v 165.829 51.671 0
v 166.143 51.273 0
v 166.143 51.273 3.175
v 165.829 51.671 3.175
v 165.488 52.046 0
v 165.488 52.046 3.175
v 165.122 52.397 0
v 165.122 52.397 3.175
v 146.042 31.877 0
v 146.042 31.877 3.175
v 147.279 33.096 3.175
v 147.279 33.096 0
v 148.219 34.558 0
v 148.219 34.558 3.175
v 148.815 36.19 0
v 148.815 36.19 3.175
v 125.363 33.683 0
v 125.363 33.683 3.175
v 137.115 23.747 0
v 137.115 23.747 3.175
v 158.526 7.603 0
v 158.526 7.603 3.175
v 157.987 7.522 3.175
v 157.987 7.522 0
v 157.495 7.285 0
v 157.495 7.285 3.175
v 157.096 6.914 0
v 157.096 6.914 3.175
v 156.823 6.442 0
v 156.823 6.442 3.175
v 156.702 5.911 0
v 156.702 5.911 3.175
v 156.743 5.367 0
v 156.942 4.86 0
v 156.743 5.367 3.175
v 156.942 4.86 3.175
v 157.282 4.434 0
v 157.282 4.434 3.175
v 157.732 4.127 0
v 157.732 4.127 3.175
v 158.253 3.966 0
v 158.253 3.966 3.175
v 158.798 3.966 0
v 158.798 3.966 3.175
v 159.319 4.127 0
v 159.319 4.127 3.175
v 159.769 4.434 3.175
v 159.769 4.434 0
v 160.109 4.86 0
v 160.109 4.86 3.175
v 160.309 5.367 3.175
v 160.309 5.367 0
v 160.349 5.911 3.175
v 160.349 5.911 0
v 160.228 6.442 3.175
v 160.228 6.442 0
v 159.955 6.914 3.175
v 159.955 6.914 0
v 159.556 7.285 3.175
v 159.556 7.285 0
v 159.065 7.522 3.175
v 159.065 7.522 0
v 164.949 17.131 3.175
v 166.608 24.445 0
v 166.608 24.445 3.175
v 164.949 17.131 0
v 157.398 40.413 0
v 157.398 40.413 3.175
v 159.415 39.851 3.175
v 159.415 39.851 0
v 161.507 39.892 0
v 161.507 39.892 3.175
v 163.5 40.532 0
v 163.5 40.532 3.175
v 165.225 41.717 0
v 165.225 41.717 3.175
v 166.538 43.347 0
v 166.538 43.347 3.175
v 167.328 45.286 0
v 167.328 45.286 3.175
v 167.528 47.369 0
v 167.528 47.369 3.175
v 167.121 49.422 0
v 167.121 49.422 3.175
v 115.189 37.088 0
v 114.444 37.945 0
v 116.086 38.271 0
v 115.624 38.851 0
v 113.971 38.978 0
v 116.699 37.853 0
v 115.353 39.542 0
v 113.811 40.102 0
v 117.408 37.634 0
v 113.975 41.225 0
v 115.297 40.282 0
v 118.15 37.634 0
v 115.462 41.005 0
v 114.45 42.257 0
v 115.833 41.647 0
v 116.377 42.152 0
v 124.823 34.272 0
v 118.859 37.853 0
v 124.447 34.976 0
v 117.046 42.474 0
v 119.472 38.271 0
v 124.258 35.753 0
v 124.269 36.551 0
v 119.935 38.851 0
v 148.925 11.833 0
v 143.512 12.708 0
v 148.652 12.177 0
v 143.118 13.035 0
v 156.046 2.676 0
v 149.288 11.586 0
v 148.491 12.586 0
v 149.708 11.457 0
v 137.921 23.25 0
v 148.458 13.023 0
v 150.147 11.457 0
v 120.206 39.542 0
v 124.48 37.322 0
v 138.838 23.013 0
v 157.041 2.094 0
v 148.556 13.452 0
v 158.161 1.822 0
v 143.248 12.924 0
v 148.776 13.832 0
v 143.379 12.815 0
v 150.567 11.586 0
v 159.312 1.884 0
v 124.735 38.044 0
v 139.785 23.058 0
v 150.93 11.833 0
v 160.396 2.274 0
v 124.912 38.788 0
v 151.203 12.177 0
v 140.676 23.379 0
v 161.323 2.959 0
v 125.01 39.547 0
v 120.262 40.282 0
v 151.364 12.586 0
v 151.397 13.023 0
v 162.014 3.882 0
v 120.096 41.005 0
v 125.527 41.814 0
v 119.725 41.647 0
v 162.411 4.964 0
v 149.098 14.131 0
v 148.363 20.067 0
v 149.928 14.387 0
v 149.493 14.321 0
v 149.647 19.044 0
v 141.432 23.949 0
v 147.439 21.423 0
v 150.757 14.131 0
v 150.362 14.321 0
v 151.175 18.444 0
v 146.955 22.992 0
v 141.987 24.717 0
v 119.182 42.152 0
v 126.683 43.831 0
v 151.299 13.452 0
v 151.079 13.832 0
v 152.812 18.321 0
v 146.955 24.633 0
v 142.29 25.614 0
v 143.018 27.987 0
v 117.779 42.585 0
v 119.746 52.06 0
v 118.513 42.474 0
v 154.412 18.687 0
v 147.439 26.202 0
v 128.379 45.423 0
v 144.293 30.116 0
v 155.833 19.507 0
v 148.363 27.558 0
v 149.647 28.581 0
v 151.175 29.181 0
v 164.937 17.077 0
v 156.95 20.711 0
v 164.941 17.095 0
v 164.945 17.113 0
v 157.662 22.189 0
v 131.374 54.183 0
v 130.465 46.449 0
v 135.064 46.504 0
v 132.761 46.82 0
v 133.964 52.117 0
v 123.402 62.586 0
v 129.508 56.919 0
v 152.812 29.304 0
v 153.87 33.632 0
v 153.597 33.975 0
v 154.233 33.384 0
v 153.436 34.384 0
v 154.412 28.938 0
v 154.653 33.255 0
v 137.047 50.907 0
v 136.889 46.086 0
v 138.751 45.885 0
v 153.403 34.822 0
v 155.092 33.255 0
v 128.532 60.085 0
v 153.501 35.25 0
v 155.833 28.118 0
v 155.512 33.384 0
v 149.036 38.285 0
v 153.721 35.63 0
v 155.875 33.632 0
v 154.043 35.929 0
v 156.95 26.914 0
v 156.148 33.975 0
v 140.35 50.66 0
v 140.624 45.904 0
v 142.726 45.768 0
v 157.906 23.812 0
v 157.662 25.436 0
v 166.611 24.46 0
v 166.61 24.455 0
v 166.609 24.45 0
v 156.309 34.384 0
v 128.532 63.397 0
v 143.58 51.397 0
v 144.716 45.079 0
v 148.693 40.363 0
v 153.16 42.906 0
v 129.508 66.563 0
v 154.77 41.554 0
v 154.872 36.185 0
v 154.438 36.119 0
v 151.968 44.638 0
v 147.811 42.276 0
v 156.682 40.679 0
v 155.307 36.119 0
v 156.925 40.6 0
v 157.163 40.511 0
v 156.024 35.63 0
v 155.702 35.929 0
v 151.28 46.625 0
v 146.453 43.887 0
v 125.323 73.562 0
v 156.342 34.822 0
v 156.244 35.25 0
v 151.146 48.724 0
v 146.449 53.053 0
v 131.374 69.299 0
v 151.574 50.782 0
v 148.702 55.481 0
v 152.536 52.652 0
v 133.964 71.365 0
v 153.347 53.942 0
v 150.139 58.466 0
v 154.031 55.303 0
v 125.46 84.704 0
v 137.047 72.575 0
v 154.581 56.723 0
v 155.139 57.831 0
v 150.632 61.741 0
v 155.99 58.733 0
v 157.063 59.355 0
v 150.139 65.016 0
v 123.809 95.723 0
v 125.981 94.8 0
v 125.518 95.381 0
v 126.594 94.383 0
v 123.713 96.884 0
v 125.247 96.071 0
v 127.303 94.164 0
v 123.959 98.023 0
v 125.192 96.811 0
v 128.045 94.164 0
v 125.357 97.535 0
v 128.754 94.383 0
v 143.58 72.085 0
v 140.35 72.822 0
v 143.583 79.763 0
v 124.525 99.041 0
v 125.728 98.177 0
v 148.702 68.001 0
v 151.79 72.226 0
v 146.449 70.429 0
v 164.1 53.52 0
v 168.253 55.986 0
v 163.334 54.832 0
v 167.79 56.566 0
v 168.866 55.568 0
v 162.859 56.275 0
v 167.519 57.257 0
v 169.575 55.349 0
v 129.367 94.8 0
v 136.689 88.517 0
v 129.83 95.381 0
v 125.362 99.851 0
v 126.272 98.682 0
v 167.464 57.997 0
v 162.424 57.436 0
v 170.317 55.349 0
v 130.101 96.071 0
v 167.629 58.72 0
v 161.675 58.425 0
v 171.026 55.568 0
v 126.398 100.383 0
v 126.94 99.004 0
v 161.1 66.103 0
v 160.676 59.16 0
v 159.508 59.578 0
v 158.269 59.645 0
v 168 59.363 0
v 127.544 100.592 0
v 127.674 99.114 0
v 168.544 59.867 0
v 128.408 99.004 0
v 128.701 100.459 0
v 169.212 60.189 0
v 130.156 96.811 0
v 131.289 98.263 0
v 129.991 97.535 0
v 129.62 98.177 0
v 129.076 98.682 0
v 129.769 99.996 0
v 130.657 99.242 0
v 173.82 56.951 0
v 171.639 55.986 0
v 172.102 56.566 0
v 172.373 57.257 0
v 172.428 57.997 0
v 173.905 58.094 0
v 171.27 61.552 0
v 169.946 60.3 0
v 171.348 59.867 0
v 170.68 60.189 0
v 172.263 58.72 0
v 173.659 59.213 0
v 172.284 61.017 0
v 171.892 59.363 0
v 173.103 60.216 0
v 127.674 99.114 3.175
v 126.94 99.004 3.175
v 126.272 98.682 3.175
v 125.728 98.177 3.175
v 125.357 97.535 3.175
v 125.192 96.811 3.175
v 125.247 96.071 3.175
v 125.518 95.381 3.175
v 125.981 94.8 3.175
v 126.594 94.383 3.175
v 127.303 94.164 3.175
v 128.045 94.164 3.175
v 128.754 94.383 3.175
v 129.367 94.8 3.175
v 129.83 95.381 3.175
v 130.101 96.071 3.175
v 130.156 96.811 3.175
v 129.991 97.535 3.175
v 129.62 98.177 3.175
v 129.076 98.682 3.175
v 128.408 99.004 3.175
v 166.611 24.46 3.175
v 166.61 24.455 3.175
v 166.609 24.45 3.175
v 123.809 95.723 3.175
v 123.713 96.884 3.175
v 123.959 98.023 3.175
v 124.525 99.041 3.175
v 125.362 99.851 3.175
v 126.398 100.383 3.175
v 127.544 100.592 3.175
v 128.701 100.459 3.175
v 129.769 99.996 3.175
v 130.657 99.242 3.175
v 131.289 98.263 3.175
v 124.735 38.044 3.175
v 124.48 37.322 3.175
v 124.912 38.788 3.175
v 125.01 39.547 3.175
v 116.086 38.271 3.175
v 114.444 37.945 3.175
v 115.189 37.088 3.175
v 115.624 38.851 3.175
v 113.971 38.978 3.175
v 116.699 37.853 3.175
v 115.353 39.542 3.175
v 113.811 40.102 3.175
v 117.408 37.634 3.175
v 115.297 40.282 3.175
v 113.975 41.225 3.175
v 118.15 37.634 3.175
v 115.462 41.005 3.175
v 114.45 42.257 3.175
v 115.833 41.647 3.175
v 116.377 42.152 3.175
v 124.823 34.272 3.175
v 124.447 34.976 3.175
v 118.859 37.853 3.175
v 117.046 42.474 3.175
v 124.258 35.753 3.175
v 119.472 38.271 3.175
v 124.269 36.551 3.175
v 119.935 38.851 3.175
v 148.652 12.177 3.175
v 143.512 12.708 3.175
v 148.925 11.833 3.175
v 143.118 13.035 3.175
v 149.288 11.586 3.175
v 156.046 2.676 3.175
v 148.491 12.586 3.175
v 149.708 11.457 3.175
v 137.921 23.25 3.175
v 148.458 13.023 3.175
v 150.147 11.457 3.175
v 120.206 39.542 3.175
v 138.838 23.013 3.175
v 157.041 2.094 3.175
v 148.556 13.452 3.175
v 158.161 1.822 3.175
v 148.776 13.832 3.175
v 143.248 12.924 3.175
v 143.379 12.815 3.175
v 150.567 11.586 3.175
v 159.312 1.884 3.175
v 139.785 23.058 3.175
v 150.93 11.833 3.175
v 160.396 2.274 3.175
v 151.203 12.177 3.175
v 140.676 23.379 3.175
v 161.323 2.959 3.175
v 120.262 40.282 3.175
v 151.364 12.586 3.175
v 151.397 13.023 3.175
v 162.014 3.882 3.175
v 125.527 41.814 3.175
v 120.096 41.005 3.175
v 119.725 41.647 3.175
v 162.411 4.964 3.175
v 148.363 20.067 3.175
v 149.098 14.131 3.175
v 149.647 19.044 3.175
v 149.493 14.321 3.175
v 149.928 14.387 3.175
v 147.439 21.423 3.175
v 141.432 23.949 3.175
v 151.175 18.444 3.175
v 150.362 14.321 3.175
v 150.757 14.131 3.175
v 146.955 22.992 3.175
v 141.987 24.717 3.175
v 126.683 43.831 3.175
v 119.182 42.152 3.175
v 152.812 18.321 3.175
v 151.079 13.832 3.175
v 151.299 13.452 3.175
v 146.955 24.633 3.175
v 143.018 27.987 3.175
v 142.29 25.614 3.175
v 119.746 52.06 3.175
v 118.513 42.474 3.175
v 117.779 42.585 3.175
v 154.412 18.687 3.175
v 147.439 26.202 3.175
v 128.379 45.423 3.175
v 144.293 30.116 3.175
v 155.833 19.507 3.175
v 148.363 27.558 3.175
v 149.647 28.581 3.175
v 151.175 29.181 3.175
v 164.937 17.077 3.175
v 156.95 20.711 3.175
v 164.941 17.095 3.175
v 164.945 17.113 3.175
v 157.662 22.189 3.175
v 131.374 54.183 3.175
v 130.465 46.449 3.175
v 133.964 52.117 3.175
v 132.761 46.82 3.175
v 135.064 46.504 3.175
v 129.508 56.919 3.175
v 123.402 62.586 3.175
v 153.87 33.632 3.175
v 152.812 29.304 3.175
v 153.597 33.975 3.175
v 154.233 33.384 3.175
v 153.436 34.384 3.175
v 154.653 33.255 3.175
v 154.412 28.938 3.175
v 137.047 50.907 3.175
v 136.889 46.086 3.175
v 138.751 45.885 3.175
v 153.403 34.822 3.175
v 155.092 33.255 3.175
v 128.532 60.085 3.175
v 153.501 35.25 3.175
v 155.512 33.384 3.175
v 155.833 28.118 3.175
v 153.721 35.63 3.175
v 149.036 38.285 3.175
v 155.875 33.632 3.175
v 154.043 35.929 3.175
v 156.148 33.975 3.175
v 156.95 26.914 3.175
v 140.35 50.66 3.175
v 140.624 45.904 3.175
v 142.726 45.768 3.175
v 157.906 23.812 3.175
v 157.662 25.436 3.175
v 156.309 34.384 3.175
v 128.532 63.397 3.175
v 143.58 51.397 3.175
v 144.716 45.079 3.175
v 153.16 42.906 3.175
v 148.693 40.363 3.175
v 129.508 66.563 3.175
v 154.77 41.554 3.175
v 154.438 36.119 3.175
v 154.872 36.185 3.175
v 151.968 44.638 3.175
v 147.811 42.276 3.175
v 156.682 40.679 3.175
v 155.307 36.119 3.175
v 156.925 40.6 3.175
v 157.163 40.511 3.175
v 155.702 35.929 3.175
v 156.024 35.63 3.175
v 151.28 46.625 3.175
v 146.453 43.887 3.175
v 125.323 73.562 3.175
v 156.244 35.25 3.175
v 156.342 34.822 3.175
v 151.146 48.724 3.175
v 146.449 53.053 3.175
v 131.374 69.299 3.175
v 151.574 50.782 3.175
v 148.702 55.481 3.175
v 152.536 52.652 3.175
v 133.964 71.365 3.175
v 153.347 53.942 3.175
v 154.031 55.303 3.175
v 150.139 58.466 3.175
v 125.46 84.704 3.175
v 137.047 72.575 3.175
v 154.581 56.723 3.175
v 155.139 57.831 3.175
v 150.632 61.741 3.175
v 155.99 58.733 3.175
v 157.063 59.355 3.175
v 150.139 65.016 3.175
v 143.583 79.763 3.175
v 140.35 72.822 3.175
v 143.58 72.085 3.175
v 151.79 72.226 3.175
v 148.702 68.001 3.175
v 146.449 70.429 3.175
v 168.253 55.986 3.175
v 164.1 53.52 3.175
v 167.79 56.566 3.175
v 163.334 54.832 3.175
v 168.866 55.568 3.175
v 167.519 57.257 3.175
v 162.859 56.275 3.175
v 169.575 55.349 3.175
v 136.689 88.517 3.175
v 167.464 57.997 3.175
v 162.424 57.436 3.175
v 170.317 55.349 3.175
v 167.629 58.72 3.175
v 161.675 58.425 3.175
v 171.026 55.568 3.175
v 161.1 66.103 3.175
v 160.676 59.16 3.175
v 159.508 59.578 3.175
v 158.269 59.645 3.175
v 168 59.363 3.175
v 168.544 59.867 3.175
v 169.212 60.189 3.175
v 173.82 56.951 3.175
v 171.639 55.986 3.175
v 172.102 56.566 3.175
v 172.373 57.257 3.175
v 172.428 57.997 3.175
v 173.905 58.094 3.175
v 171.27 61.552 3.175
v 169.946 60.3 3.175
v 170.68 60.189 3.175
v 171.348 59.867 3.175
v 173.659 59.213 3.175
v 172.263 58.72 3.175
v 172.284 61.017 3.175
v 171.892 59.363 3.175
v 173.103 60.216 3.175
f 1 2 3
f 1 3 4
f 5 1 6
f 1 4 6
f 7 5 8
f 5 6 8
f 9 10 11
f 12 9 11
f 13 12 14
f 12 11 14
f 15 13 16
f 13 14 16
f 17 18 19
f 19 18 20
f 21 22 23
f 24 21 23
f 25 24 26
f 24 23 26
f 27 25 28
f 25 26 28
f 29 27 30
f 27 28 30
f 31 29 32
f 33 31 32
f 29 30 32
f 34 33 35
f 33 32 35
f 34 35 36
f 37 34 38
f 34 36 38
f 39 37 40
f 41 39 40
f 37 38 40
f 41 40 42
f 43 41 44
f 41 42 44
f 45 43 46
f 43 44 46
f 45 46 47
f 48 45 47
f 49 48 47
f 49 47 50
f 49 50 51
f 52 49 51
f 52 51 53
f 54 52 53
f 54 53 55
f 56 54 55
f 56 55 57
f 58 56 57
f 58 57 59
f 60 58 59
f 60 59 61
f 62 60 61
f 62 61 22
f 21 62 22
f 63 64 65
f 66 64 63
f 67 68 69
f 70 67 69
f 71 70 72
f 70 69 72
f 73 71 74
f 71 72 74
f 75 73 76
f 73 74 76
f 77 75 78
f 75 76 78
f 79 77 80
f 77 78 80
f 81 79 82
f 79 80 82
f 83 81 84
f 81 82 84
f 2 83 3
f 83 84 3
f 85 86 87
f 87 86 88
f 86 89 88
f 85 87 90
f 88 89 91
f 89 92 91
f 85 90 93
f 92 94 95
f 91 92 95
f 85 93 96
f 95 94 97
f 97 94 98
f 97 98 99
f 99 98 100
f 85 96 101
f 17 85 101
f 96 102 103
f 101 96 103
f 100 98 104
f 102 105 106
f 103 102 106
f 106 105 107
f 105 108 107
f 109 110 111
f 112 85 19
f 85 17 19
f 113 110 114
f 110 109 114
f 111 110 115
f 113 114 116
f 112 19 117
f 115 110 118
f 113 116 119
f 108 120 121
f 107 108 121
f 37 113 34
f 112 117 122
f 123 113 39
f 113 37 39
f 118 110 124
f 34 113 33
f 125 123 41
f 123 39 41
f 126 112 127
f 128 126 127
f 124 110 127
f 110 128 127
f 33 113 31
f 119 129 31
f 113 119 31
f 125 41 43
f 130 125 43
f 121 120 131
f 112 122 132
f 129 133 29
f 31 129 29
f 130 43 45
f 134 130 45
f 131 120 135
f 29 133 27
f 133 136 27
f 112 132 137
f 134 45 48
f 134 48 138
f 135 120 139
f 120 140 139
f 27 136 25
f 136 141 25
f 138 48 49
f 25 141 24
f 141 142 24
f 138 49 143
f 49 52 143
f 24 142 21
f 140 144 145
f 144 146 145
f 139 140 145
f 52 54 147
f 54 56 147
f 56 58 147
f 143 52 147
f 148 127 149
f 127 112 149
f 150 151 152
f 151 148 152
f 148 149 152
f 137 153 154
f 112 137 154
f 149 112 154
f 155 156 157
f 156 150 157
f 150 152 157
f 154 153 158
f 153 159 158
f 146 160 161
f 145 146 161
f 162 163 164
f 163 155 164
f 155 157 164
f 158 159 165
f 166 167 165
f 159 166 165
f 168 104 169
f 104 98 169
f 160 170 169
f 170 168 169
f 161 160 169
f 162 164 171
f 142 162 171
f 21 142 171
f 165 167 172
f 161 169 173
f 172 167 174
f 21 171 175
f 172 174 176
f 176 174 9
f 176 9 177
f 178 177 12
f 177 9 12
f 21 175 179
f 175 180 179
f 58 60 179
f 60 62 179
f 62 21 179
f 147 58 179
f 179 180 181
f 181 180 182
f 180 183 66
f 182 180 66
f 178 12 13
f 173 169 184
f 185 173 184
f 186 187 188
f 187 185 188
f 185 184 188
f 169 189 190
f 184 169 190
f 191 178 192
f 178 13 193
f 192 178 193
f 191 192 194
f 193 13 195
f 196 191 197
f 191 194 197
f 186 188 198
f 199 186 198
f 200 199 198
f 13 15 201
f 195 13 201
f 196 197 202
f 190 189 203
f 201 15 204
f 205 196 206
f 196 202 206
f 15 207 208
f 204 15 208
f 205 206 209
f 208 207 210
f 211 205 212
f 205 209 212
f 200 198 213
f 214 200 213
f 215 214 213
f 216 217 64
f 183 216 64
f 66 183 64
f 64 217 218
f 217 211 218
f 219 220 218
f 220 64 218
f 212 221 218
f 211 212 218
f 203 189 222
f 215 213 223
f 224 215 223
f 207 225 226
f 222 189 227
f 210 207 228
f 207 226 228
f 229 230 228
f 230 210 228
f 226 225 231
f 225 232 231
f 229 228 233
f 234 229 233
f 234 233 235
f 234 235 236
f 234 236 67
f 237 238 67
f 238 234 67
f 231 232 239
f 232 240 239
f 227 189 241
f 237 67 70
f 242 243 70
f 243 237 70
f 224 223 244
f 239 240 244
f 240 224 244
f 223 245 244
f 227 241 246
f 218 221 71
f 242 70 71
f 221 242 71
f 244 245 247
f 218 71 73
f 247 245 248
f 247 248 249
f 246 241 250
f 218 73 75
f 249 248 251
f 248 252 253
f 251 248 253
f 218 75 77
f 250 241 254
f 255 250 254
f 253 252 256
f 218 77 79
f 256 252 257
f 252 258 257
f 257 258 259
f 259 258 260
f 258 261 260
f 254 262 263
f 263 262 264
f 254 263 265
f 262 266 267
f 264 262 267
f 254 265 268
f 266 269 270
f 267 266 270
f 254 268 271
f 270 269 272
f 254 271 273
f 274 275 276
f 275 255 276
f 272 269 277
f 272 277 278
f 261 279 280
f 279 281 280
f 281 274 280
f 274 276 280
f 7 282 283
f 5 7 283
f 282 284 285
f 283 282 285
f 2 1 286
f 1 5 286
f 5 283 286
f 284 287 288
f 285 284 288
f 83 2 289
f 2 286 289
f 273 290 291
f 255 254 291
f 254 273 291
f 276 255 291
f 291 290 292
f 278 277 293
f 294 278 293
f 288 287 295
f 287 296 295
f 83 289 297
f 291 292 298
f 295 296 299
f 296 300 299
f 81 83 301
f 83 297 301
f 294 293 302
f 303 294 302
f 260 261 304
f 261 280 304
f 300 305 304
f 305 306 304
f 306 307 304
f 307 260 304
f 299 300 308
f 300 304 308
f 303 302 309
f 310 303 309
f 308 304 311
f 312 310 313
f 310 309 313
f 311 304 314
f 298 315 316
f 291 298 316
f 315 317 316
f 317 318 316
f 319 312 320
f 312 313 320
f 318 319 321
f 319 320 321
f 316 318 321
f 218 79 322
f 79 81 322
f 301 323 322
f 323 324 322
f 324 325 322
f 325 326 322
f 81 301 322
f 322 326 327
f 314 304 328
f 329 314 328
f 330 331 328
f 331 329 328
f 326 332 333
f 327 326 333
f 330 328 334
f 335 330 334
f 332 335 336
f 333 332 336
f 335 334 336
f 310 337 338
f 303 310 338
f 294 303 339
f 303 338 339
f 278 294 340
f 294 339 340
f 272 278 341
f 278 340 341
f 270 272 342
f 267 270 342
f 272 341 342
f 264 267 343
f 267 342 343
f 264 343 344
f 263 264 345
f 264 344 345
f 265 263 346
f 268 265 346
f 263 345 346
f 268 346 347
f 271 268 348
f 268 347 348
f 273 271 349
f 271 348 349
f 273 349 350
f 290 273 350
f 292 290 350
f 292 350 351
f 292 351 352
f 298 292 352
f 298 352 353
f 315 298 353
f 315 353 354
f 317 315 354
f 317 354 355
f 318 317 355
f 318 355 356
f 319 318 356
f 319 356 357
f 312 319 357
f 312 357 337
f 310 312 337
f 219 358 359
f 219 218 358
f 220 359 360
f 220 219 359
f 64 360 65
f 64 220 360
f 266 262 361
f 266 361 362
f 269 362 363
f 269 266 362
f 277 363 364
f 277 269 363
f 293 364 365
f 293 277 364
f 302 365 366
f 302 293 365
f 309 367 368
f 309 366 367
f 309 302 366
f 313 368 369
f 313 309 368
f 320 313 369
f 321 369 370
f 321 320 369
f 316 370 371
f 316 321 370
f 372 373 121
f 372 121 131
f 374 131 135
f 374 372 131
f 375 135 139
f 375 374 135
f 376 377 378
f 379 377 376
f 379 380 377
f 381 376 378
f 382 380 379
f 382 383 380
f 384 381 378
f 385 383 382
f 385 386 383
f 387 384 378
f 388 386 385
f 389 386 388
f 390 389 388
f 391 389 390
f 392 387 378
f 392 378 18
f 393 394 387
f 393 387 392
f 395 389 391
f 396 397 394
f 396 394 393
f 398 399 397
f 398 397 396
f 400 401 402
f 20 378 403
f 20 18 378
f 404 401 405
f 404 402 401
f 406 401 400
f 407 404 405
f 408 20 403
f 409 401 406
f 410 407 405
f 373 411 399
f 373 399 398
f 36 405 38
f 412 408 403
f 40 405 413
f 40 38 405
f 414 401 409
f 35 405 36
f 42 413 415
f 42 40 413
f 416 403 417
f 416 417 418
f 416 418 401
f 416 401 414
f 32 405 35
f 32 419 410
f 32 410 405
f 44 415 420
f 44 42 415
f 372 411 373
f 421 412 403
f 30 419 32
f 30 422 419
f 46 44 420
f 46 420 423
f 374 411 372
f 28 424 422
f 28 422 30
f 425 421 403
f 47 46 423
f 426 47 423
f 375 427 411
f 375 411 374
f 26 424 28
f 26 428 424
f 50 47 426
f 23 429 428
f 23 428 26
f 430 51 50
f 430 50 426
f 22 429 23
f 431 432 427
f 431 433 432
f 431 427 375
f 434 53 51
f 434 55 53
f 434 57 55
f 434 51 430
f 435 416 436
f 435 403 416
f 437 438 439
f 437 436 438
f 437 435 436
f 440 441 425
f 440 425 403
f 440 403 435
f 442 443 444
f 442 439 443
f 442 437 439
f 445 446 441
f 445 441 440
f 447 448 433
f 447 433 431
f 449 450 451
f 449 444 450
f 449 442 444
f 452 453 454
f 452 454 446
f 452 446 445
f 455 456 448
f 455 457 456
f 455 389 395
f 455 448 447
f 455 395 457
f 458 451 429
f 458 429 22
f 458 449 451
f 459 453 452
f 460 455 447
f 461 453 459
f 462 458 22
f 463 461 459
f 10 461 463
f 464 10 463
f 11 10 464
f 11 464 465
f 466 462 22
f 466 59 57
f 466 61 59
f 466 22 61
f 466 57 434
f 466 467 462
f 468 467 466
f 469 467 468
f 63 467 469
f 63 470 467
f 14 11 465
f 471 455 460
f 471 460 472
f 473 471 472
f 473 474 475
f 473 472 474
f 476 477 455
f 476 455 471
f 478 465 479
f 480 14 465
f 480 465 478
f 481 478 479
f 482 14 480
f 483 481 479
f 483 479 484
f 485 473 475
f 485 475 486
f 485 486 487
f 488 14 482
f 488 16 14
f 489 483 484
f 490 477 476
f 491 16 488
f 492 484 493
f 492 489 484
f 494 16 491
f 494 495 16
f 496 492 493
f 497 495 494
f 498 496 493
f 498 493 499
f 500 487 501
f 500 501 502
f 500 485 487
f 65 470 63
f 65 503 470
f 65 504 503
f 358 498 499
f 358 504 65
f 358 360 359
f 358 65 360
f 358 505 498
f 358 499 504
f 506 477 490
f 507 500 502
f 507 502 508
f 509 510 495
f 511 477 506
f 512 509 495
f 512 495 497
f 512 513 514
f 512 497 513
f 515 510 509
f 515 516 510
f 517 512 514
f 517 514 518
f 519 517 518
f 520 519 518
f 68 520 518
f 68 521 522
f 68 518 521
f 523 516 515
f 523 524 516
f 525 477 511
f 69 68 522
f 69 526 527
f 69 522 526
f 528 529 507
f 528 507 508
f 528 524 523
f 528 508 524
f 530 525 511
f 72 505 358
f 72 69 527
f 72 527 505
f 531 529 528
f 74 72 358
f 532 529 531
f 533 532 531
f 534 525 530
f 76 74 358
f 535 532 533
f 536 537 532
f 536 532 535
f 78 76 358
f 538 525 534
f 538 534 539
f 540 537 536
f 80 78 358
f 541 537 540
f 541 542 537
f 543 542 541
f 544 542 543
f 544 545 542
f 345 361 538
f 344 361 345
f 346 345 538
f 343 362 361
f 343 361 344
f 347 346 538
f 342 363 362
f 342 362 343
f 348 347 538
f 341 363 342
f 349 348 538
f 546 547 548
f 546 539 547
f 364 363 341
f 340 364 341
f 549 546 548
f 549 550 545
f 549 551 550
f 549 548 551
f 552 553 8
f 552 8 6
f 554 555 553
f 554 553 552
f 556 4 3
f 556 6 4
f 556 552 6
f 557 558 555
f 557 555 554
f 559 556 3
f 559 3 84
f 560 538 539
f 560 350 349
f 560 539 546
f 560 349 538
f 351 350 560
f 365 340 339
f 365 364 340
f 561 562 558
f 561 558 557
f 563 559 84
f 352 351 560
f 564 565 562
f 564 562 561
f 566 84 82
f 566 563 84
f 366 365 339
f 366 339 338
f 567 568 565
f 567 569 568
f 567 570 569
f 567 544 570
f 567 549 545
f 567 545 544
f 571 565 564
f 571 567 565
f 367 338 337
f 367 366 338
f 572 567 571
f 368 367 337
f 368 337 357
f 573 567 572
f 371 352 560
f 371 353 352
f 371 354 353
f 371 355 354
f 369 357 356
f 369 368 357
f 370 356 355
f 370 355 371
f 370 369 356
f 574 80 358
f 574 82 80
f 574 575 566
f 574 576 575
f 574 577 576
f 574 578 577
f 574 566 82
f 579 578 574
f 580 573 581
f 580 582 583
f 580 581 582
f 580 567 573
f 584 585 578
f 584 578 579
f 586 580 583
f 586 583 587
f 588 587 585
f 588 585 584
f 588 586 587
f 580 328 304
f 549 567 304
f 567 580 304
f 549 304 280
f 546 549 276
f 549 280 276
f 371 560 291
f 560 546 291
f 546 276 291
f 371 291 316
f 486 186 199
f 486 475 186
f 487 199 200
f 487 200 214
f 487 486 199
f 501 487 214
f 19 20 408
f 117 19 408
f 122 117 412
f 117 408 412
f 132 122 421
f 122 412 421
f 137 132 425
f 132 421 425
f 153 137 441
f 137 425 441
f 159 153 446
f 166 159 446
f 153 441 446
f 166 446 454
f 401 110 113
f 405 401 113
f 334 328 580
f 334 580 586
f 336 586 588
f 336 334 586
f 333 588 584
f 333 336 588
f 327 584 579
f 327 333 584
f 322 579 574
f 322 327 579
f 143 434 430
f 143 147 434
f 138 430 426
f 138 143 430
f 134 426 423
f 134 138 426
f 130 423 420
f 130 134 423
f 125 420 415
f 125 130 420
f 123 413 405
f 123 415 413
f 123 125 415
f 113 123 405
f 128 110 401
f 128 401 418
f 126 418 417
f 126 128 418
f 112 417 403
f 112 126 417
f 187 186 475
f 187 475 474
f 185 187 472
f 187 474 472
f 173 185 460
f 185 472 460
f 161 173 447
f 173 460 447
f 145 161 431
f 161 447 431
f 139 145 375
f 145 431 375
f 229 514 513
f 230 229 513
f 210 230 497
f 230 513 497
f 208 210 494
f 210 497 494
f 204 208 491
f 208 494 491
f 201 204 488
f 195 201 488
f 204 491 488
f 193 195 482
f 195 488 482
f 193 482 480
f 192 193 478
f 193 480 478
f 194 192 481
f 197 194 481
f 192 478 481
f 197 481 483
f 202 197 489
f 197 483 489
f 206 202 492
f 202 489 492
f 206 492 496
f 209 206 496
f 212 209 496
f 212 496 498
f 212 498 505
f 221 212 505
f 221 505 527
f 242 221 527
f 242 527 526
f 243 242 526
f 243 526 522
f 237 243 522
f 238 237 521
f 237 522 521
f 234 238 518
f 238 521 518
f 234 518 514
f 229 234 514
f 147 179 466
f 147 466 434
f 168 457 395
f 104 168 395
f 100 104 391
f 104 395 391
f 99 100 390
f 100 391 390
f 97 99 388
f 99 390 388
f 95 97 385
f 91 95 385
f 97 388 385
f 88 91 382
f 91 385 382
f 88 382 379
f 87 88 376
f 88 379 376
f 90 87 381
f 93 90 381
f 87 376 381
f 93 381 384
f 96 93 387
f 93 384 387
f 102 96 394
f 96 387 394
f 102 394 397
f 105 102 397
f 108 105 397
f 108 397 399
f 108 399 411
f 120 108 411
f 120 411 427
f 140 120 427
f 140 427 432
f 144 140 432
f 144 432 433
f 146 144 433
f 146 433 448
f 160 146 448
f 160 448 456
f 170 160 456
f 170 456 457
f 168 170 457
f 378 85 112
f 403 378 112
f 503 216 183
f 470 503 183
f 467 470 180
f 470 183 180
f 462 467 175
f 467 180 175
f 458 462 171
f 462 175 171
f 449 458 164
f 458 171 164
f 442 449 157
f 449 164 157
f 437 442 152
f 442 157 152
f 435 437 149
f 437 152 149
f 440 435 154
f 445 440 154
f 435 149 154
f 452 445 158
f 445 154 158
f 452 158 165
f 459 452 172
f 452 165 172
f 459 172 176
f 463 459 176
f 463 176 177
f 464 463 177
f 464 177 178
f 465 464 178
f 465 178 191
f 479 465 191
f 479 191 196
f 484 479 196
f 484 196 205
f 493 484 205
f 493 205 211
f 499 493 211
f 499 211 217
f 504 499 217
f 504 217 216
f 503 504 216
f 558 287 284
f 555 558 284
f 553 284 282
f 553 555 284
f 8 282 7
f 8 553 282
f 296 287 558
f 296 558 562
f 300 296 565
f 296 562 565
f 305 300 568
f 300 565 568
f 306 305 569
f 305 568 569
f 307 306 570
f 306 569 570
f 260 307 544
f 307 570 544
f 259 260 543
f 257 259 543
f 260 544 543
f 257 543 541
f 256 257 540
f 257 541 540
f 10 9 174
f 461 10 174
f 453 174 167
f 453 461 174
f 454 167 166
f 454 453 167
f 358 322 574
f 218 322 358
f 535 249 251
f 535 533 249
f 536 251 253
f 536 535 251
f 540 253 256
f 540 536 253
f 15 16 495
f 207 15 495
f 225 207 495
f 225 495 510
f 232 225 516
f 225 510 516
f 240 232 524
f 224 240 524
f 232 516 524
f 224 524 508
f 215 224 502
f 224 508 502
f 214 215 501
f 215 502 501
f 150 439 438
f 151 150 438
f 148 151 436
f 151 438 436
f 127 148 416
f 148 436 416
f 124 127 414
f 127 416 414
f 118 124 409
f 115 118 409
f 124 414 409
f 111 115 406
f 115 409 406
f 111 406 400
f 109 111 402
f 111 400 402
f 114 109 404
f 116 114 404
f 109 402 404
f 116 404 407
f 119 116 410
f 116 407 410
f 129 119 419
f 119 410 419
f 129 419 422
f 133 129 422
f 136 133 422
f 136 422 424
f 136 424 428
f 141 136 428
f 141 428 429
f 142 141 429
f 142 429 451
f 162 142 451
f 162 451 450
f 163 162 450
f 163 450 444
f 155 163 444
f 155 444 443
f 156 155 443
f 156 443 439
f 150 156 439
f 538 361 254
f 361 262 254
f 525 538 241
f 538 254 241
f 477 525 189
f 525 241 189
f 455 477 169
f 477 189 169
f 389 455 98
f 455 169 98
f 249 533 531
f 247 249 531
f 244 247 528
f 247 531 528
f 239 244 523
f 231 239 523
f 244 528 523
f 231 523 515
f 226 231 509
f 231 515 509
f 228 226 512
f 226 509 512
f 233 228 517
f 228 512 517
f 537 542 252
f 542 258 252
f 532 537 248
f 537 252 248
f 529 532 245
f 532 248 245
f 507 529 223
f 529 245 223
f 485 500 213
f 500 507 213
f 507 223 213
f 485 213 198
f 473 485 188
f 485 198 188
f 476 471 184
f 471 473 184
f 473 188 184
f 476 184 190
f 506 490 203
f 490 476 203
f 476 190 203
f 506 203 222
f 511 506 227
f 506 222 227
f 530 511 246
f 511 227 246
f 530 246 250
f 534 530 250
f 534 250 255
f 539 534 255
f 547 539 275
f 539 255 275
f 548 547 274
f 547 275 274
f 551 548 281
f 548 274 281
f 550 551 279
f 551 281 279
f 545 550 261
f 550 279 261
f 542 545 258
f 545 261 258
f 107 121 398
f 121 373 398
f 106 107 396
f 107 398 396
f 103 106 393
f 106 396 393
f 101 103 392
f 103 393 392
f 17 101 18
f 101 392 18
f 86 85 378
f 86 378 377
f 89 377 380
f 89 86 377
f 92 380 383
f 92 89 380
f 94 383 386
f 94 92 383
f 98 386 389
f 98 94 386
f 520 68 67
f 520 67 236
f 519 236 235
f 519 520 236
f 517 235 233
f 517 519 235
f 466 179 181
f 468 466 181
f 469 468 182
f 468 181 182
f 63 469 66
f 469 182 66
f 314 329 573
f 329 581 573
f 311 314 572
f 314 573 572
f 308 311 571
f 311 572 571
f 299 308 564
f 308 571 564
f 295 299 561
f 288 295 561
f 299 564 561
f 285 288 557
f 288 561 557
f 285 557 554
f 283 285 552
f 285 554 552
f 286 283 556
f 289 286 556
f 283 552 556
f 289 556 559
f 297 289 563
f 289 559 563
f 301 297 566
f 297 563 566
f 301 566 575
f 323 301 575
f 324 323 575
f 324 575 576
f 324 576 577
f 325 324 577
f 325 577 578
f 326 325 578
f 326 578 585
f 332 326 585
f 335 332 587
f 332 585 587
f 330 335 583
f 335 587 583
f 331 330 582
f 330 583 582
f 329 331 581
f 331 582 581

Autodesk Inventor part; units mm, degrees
ref_plane "YZ Plane" through (0, 0, 0) normal (1, 0, 0) x (0, 1, 0)
ref_plane "XZ Plane" through (0, 0, 0) normal (0, 1, 0) x (-1, 0, 0)
ref_plane "XY Plane" through (0, 0, 0) normal (0, 0, 1) x (1, 0, 0)
sketch "Sketch1" plane through (0, 0, 0) normal (0, 0, 1) x (1, 0, 0)
  line L0 (0, 0) -> (304.8, 0) construction
  line L1 (304.8, 0) -> (304.8, 50.8) construction
  line L2 (304.8, 50.8) -> (0, 50.8) construction
  line L3 (0, 50.8) -> (0, 0) construction
  circle A0 centre (152.4, 23.8125) radius 6.35 construction
  circle A1 centre (152.4, 23.8125) radius 34.29 construction
  circle A2 centre (152.4, 23.8125) radius 22.225 construction
  line L4 (152.4, 23.8125) -> (139.52, 61.741) construction
  circle A3 centre (139.52, 61.741) radius 9.525 construction
  circle A4 centre (139.52, 61.741) radius 17.78 construction
  circle A5 centre (91.5619, 85.09) radius 31.75 construction
  circle A6 centre (163.3424, 109.4657) radius 31.75 construction
  circle A7 centre (222.6465, 85.09) radius 31.75 construction
  line L5 (0, 50.8) -> (0, 53.34) construction
  line L6 (0, 53.34) -> (304.8, 53.34) construction
  line L7 (304.8, 53.34) -> (304.8, 50.8) construction
  circle A8 centre (139.52, 61.741) radius 21.59 construction
  circle A9 centre (152.4, 23.8125) radius 46.99 construction
  circle A10 centre (152.4, 23.8125) radius 50.8 construction
  arc A11 (86.3865, 79.4564) -> (92.4363, 92.6899) centre (91.5619, 85.09) ccw construction
  circle A12 centre (163.3424, 109.4657) radius 7.65 construction
  arc A13 (222.2546, 92.73) -> (226.29, 78.3634) centre (222.6465, 85.09) ccw construction
  circle A14 centre (163.3424, 109.4657) radius 9.1 construction
  circle A15 centre (139.52, 61.741) radius 22.9 construction
  line L8 (86.3865, 79.4564) -> (124.0276, 44.8769) construction
  line L9 (170.8782, 108.1486) -> (162.078, 57.7984) construction
  line L10 (92.4363, 92.6899) -> (91.5619, 85.09) construction
  line L11 (91.5619, 85.09) -> (86.3865, 79.4564) construction
  circle A16 centre (127.6738, 96.6252) radius 3.9688
  circle A17 centre (127.6738, 96.6252) radius 7.9375 construction
  line L12 (92.4363, 92.6899) -> (126.7664, 88.7398) construction
  line L13 (133.1953, 90.9229) -> (158.0208, 114.9615) construction
  line L14 (158.0208, 114.9615) -> (163.3424, 109.4657) construction
  line L15 (170.8782, 108.1486) -> (163.3424, 109.4657) construction
  line L16 (139.52, 61.741) -> (127.6738, 96.6252) construction
  line L17 (91.5619, 85.09) -> (163.3424, 109.4657) construction
  line L18 (152.4, 23.8125) -> (91.5619, 85.09) construction
  line L19 (152.4, 23.8125) -> (163.3424, 109.4657) construction
  circle A18 centre (127.6738, 96.6252) radius 9.2075 construction
  circle A19 centre (127.6738, 96.6252) radius 6.1595 construction
  arc A20 (92.4363, 92.6899) -> (86.3865, 79.4564) centre (91.5619, 85.09) ccw construction
  circle A21 centre (163.3424, 109.4657) radius 25.4 construction
  circle A22 centre (222.6465, 85.09) radius 25.4 construction
  line L20 (104.7627, 113.9656) -> (78.361, 56.2144) construction
  circle A23 centre (91.5619, 85.09) radius 25.4 construction
  line L21 (214.0607, 115.6571) -> (231.2324, 54.5229) construction
  line L22 (56.0019, 185.6657) -> (208.4019, 185.6657)
  line L23 (208.4019, 185.6657) -> (208.4019, -4.8343)
  line L24 (208.4019, -4.8343) -> (56.0019, -4.8343)
  line L25 (56.0019, -4.8343) -> (56.0019, 185.6657)
  circle A24 centre (139.52, 61.741) radius 11.1125
  arc A25 (226.1312, 75.4959) -> (221.6192, 95.3086) centre (223.8752, 85.4023) ccw construction
  line L26 (221.4349, 84.7168) -> (229.5152, 60.6363) construction
  line L27 (223.8752, 85.4023) -> (229.5152, 60.6363) construction
  line L28 (221.4349, 84.7168) -> (213.3547, 108.7973) construction
  line L29 (223.8752, 85.4023) -> (218.2352, 110.1682) construction
  arc A26 (212.5972, 111.0549) -> (214.1122, 106.5398) centre (213.3547, 108.7973) ccw construction
  arc A27 (218.764, 107.8464) -> (217.7065, 112.49) centre (218.2352, 110.1682) ccw construction
  arc A28 (218.764, 107.8464) -> (214.1122, 106.5398) centre (229.5152, 60.6363) ccw construction
  arc A29 (217.7065, 112.49) -> (212.5972, 111.0549) centre (229.5152, 60.6363) ccw construction
  line L30 (213.3547, 108.7973) -> (212.5972, 111.0549) construction
  line L31 (218.2352, 110.1682) -> (217.7065, 112.49) construction
  arc A30 (221.6192, 95.3086) -> (218.2029, 94.349) centre (229.5152, 60.6363) ccw construction
  arc A31 (226.1312, 75.4959) -> (224.667, 75.0846) centre (229.5152, 60.6363) ccw construction
  line L32 (104.4015, 107.0791) -> (92.7013, 84.5343) construction
  line L33 (81.0012, 61.9895) -> (90.3961, 85.5882) construction
  arc A32 (100.6718, 111.3992) -> (98.9102, 106.9744) centre (99.791, 109.1868) ccw construction
  arc A33 (103.3046, 104.9655) -> (105.4983, 109.1926) centre (104.4015, 107.0791) ccw construction
  arc A34 (103.3046, 104.9655) -> (98.9102, 106.9744) centre (81.0012, 61.9895) ccw construction
  line L34 (99.791, 109.1868) -> (100.6718, 111.3992) construction
  line L35 (104.4015, 107.0791) -> (105.4983, 109.1926) construction
  arc A35 (105.4983, 109.1926) -> (100.6718, 111.3992) centre (81.0012, 61.9895) ccw construction
  arc A36 (218.2029, 94.349) -> (224.667, 75.0846) centre (221.4349, 84.7168) ccw construction
  arc A37 (88.0213, 75.5164) -> (97.3814, 93.5522) centre (92.7013, 84.5343) ccw construction
  line L36 (90.3961, 85.5882) -> (99.791, 109.1868) construction
  line L37 (92.7013, 84.5343) -> (81.0012, 61.9895) construction
  arc A38 (88.0213, 75.5164) -> (86.6381, 76.1487) centre (81.0012, 61.9895) ccw construction
  arc A39 (97.3814, 93.5522) -> (94.1541, 95.0276) centre (81.0012, 61.9895) ccw construction
  arc A40 (94.1541, 95.0276) -> (86.6381, 76.1487) centre (90.3961, 85.5882) ccw construction
  line L38 (163.3424, 109.4657) -> (140.8985, 121.3583) construction
  line L39 (163.3424, 109.4657) -> (185.7862, 97.5731) construction
  circle A41 centre (139.52, 61.741) radius 26.71 construction
  line L40 (222.2546, 92.73) -> (138.1517, 88.4159) construction
  line L41 (226.29, 78.3634) -> (152.2412, 38.2549) construction
  line L42 (222.6465, 85.09) -> (222.2546, 92.73) construction
  line L43 (222.6465, 85.09) -> (226.29, 78.3634) construction
  line L44 (139.52, 61.741) -> (138.1517, 88.4159) construction
  line L45 (139.52, 61.741) -> (152.2412, 38.2549) construction
  arc A42 (226.29, 78.3634) -> (222.2546, 92.73) centre (222.6465, 85.09) ccw construction
  arc A43 (226.29, 78.3634) -> (225.5574, 78.0155) centre (222.6465, 85.09) ccw construction
  line L46 (139.52, 61.741) -> (222.6465, 85.09) construction
  circle A44 centre (139.52, 61.741) radius 15.875
  circle A45 centre (117.7793, 40.0955) radius 3.9688
  circle A46 centre (169.9459, 57.8106) radius 3.9688
  circle A47 centre (56.3388, 79.9803) radius 69.2823
  circle A48 centre (194.3931, 126.8617) radius 69.2823
  arc A49 (163.3226, 14.7011) -> (164.9427, 17.104) centre (152.4, 23.8125) ccw
  circle A50 centre (152.4, 23.8125) radius 11.176 construction
  circle A51 centre (152.4, 23.8125) radius 19.05 construction
  line L47 (115.1893, 37.0884) -> (143.1176, 13.0348)
  line L48 (152.4, 23.8125) -> (143.1176, 13.0348) construction
  line L49 (173.8315, 57.0025) -> (166.326, 20.9161) construction
  line L50 (152.4, 23.8125) -> (166.326, 20.9161) construction
  arc A52 (154.6674, 4.8437) -> (156.0456, 2.6757) centre (158.5256, 5.7742) ccw
  line L51 (152.4, 23.8125) -> (158.5256, 5.7742) construction
  arc A53 (156.9738, 10.3439) -> (163.3226, 14.7011) centre (152.4, 23.8125) ccw
  arc A54 (150.0325, 9.7869) -> (156.9738, 10.3439) centre (152.4, 23.8125) ccw
  arc A55 (157.2494, 9.5322) -> (154.6674, 4.8437) centre (158.5256, 5.7742) ccw
  arc A56 (162.061, 7.5775) -> (157.2494, 9.5322) centre (158.5256, 5.7742) ccw
  line L52 (143.5118, 12.7075) -> (156.0456, 2.6757)
  line L53 (162.3795, 4.8266) -> (166.2126, 20.4164) construction
  line L54 (143.5118, 12.7075) -> (152.4, 23.8125) construction
  line L55 (152.4, 23.8125) -> (166.2126, 20.4164) construction
  arc A57 (166.2126, 20.4164) -> (166.326, 20.9161) centre (152.4, 23.8125) ccw
  arc A58 (166.326, 20.9161) -> (166.6096, 24.4522) centre (152.4, 23.8125) ccw construction
  arc A59 (143.1176, 13.0348) -> (143.5118, 12.7075) centre (152.4, 23.8125) ccw
  arc A60 (143.5118, 12.7075) -> (150.0325, 9.7869) centre (152.4, 23.8125) ccw
  circle A61 centre (152.4, 23.8125) radius 5.5065
  line L56 (152.4, 23.8125) -> (166.2715, 20.6657)
  line L57 (166.6096, 24.4522) -> (164.9427, 17.104)
  arc A62 (164.9427, 17.104) -> (166.2126, 20.4164) centre (152.4, 23.8125) ccw construction
  line L58 (164.9427, 17.104) -> (162.4107, 4.9639)
  line L59 (158.5256, 5.7742) -> (162.4107, 4.9639) construction
  arc A63 (166.6096, 24.4522) -> (143.1176, 13.0348) centre (152.4, 23.8125) ccw
  line L60 (169.9459, 57.8106) -> (173.8204, 56.9509) construction
  line L61 (173.8204, 56.9509) -> (166.6096, 24.4522)
  line L62 (154.8725, 34.7116) -> (149.9275, 12.9134) construction
  circle A64 centre (154.8725, 34.7116) radius 2.1082
  circle A65 centre (149.9275, 12.9134) radius 2.1082
  arc A66 (162.4107, 4.9639) -> (162.061, 7.5775) centre (158.5256, 5.7742) ccw
  arc A67 (156.0456, 2.6757) -> (162.4107, 4.9639) centre (158.5256, 5.7742) ccw
  point P0 (215.7779, 109.5437)
  point P1 (102.1225, 108.1905)
  point P2 (145.0256, 46.8513)
  point P3 (171.2705, 61.5518)
  point P4 (114.4504, 42.2565)
  point P5 (131.2886, 98.2635)
  point P6 (123.8088, 95.7234)
  dimension "d127" = 31.75
  dimension "d150" = 38.1
  dimension "d1" = 50.8
  dimension "d3" = 23.8125
  dimension "d4" = 152.4
  dimension "d7" = 68.58
  dimension "d8" = 44.45
  dimension "d9" = 19.05
  dimension "d10" = 35.56
  dimension "d11" = 40.0558
  dimension "d12" = 63.5
  dimension "d13" = 63.5
  dimension "d14" = 63.5
  dimension "d15" = 2.54
  dimension "d16" = 304.8
  dimension "d17" = 43.18
  dimension "d18" = 93.98
  dimension "d19" = 101.6
  dimension "d21" = 15.3
  dimension "d22" = 15.3
  dimension "d24" = 18.2
  dimension "d29" = 45.8
  dimension "d30" = 143.991
  dimension "d31" = 7.9375
  dimension "d32" = 15.875
  dimension "d33" = 143.991
  dimension "d35" = 18.415
  dimension "d37" = 12.319
  dimension "d40" = 50.8
  dimension "d41" = 50.8
  dimension "d42" = 18.004
  dimension "d43" = 18.004
  dimension "d44" = 50.8
  dimension "d53" = 152.4
  dimension "d54" = 190.5
  dimension "d55" = 35.56
  dimension "d56" = 76.2
  dimension "d57" = 22.225
  dimension "d67" = 25.4
  dimension "d68" = 25.4
  dimension "d69" = 2.86
  dimension "d70" = 25.4
  dimension "d71" = 25.4
  dimension "d72" = 4.7625
  dimension "d75" = 2.86
  dimension "d80" = 4.7625
  dimension "d82" = 4.7625
  dimension "d83" = 50.8
  dimension "d84" = 50.8
  dimension "d85" = 10.16
  dimension "d97" = 48.4188
  dimension "d99" = 20.32
  dimension "d101" = 25.4
  dimension "d102" = 25.4
  dimension "d103" = 10.16
  dimension "d105" = 18.004
  dimension "d106" = 18.004
  dimension "d107" = 53.42
  dimension "d108" = 154.494
  dimension "d109" = 7.65
  dimension "d111" = 86.3435
  dimension "d112" = 12.753
  dimension "d113" = 12.753
  dimension "d135" = 7.9375
  dimension "d136" = 7.9375
  dimension "d149" = 22.352
extrude "Extrusion3" add sketch "Sketch1" along normal blind 3.175 contours A16 | A16 A48 A44 A47 | A48 A46 L61 A63 L47 A45 A47 A44 | A44 | A46 | A45 | L57 A49 A53 A54 A60 A59 A63 | A60 A54 A53 A49 L58 A66 A56 A55 A52 L52 | A52 A55 A56 A66 A67 | A64 | A65
hole "Hole3" at (81.0012, 61.9895, 0) at (229.5152, 60.6363, 0) at (185.7862, 97.5731, 0) at (215.7779, 109.5437, 0) at (117.7793, 40.0955, 0) at (169.9459, 57.8106, 0) at (127.6738, 96.6252, 0) direction (0, 0, 1) diameter 4.9784 end through all clearance for "Socket Head Cap Screw" size "#10" standard "Ansi Unified Screw Threads"
hole "Hole4" at (100.6718, 111.3992, 0) at (105.4983, 109.1926, 0) at (140.8985, 121.3583, 0) at (102.1225, 108.1905, 0) at (158.5256, 5.7742, 0) direction (0, 0, 1) diameter 3.6576 end through all clearance for "Flat Head Machine Screw (82)" size "#6" standard "Ansi Unified Screw Threads"
hole "Hole5" at (154.8725, 34.7116, 0) at (149.9275, 12.9134, 0) direction (0, 0, 1) diameter 2.9464 end through all clearance for "Socket Head Cap Screw" size "#4" standard "Ansi Unified Screw Threads"
fillet "Fillet2" radius 3.175 2 edges at (164.9427, 17.104, 1.5875) (166.6096, 24.4522, 1.5875)
sketch "Sketch3" plane through (0, 0, 3.175) normal (0, 0, 1) x (1, 0, 0)
  circle A0 centre (152.4, 23.8125) radius 5.5065 projected
  circle A1 centre (139.52, 61.741) radius 11.1125 projected
  circle A2 centre (117.7793, 40.0955) radius 2.4892 projected
  circle A3 centre (149.9275, 12.9134) radius 1.4732 projected
  circle A4 centre (154.8725, 34.7116) radius 1.4732 projected
  arc A5 (142.2903, 25.6144) -> (146.0422, 31.8766) centre (152.4, 23.8125) ccw
  circle A6 centre (154.8725, 34.7116) radius 6.2357
  arc A7 (125.0102, 39.5472) -> (124.4796, 37.322) centre (117.7793, 40.0955) ccw
  arc A8 (140.6237, 45.9044) -> (135.0642, 46.5042) centre (139.52, 61.741) ccw
  arc A9 (125.0102, 39.5472) -> (135.0642, 46.5042) centre (132.8558, 38.9523) ccw construction
  arc A10 (140.6237, 45.9044) -> (146.0422, 31.8766) centre (141.1708, 38.0554) ccw construction
  line L0 (117.7793, 40.0955) -> (125.3632, 33.6831)
  arc A11 (125.3632, 33.6831) -> (124.4796, 37.322) centre (127.4132, 36.1076) ccw construction
  arc A12 (137.1146, 23.747) -> (142.2903, 25.6144) centre (139.1646, 26.1715) ccw
  arc A13 (124.4796, 37.322) -> (125.3632, 33.6831) centre (127.4132, 36.1076) ccw
  arc A14 (135.0642, 46.5042) -> (125.0102, 39.5472) centre (132.8558, 38.9523) ccw
  arc A15 (124.4796, 37.322) -> (125.0102, 39.5472) centre (117.7793, 40.0955) ccw
  arc A16 (135.0642, 46.5042) -> (140.6237, 45.9044) centre (139.52, 61.741) ccw
  arc A17 (148.8146, 36.19) -> (140.6237, 45.9044) centre (141.1708, 38.0554) ccw
  arc A18 (146.0422, 31.8766) -> (148.8146, 36.19) centre (141.1708, 38.0554) ccw
  arc A19 (146.0422, 31.8766) -> (142.2903, 25.6144) centre (152.4, 23.8125) ccw
  arc A20 (142.2903, 25.6144) -> (137.1146, 23.747) centre (139.1646, 26.1715) ccw construction
  line L1 (137.1146, 23.747) -> (149.9275, 12.9134)
  line L2 (125.3632, 33.6831) -> (137.1146, 23.747)
  line L3 (166.6112, 24.4595) -> (173.8204, 56.9509) projected
  arc A21 (131.2886, 98.2635) -> (171.2705, 61.5518) centre (194.3931, 126.8617) ccw projected
  circle A22 centre (169.9459, 57.8106) radius 2.4892 projected
  arc A23 (152.5359, 52.6525) -> (156.6824, 40.6788) centre (158.9547, 48.1705) ccw
  arc A24 (156.6824, 40.6788) -> (152.5359, 52.6525) centre (158.9547, 48.1705) ccw construction
  circle A25 centre (169.9459, 57.8106) radius 7.2517
  arc A26 (154.581, 56.723) -> (162.8587, 56.2747) centre (158.6584, 55.3645) ccw construction
  arc A27 (162.8587, 56.2747) -> (154.581, 56.723) centre (158.6584, 55.3645) ccw
  arc A28 (165.1215, 52.3966) -> (157.3984, 40.4128) centre (160.3212, 47.0097) ccw construction
  line L4 (168.0799, 48.6677) -> (166.1231, 39.8486) construction
  arc A29 (166.1426, 51.2726) -> (165.1215, 52.3966) centre (160.3212, 47.0097) ccw
  arc A30 (157.3984, 40.4128) -> (166.1426, 51.2726) centre (160.3212, 47.0097) ccw
  point P0 (0, 0)
  dimension "d194" = 4.7625
  dimension "d195" = 4.7625
  dimension "d196" = 4.7625
  dimension "d197" = 4.7625
  dimension "d200" = 6.35
  dimension "d201" = 6.35
  dimension "d204" = 4.7625
  dimension "d205" = 4.7625
  dimension "d206" = 6.35
  dimension "d208" = 3.81
extrude "Extrusion5" cut sketch "Sketch3" against normal through all contours A19 A12 L2 A13 A15 A14 A16 A17 A18 | A6 A23 A8 A27 A25 A29 A30
equation "\"d8\" = Gear35tPD"
equation "\"d9\" = Gear15tPD"
equation "\"d10\" = Gear28tPD"
equation "\"d11\" = 0.5 * Gear48tPD + 0.5 * Gear15tPD + MeshingClearance"
equation "\"d12\" = CimOD"
equation "\"d13\" = CimOD"
equation "\"d14\" = CimOD"
equation "\"d17\" = Gear28tPD + ClearanceDiameter"
equation "\"d18\" = WheelOD"
equation "\"d19\" = WheelClearance"
equation "\"Pulley48tPD\" = 45.8"
equation "\"Pulley19tPD\" = 18.2"
equation "\"Pulley16tPD\" = 15.3"
equation "\"Gear15tPD\" = 19.05"
equation "\"Gear35tPD\" = 44.45"
equation "\"Gear48tPD\" = 60.96"
equation "\"Gear28tPD\" = 35.56"
equation "\"BearingLargeOD\" = 28.575"
equation "\"BearingSmallOD\" = 22.225"
equation "\"MeshingClearance\" = 0.0508"
equation "\"CimOD\" = 63.5"
equation "\"WheelOD\" = 93.98"
equation "\"ClearanceDiameter\" = 7.62"
equation "\"WheelClearance\" = 101.6"
equation "\"TensioningBearingID\" = 6.35"
equation "\"TensioningBearingOD\" = 15.875"
equation "\"SpingClipClearance\" = 8.89"
equation "\"Pi\" = 79.79645"
equation "\"Pulley56tPD\" = 53.5"
equation "\"BearingXLargeOD\" = 34.925"
properties part number "OutlineSketch1" material "Aluminum 6061"
